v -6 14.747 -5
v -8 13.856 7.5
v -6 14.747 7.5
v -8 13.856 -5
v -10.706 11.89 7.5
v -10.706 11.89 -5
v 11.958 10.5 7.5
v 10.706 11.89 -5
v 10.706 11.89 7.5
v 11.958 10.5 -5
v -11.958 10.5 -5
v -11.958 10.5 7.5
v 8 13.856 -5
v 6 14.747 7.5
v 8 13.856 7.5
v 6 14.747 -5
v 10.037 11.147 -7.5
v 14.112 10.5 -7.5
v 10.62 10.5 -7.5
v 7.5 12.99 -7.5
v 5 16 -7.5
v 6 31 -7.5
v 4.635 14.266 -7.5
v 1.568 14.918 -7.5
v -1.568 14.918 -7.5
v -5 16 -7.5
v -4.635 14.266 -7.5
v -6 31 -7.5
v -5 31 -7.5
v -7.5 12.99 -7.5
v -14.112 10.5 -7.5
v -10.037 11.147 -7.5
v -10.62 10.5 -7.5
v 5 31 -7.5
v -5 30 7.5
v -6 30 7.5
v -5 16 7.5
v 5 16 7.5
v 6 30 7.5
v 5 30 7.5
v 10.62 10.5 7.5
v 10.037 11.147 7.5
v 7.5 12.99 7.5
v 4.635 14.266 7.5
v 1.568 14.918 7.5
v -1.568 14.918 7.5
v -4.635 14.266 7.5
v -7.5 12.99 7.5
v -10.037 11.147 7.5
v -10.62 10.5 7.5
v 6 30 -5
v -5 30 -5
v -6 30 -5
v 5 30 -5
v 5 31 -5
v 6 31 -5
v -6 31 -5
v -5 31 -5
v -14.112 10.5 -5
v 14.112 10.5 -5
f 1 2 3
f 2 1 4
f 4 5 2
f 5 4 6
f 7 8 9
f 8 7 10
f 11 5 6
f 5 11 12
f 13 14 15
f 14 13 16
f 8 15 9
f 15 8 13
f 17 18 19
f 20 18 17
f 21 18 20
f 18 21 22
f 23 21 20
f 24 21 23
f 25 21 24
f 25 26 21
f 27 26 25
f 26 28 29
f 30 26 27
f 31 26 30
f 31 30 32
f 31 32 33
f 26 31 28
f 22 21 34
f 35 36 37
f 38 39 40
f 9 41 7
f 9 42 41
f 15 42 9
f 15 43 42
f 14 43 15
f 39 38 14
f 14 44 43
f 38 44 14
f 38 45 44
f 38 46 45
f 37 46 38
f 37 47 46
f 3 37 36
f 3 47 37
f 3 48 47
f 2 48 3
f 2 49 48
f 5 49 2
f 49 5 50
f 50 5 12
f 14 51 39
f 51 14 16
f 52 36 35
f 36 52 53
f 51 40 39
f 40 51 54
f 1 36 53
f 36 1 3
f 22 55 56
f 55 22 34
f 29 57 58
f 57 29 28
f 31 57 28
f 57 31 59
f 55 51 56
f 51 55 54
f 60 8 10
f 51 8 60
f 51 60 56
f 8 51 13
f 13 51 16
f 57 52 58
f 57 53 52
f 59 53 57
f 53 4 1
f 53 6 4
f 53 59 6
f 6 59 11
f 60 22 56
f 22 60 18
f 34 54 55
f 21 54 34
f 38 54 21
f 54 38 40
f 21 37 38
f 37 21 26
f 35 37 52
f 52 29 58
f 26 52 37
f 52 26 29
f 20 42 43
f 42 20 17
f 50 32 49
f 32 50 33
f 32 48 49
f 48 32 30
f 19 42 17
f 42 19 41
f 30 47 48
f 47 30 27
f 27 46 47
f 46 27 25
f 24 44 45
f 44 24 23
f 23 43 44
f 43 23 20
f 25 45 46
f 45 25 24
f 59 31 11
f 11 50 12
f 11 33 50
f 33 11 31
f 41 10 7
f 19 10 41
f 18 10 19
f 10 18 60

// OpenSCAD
tube_diameter = 28;
margin = 1 ;
thickness	    =1;
width = 15;
beam_size = 10;
beam_thickness = 15;
clip_width=10;

rotate([-90,0,0]) difference(){
	union(){
		// Cylinder
		rotate([90,0,0]) cylinder(r=tube_diameter/2+thickness+margin, h = width, center=true);

		// Top flat part
		translate([0, 0, beam_thickness]) cube(size=[beam_size+2*thickness, width, tube_diameter+2*thickness], 	center = true);
		
		// Part to block strap
		translate([0, width/2-(width-clip_width)/4, 0]) hull(){
		rotate([90,0,0]) cylinder(r=tube_diameter/2+thickness+margin+1, h = (width-clip_width)/2, center=true);
		translate([0, 0, beam_thickness+1]) cube(size=[beam_size+2*thickness, (width-clip_width)/2, tube_diameter+2*thickness], center = true);
		}

//		// Second part to block strap
//		translate([0, -width/2+(width-clip_width)/4, 0]) hull(){
//		rotate([90,0,0]) cylinder(r=tube_diameter/2+thickness+margin+1, h = (width-clip_width)/2, center=true);
//		translate([0, 0, beam_thickness+1]) cube(size=[beam_size+2*thickness, (width-clip_width)/2, tube_diameter+2*thickness], center = true);
//		}
	}

	// Place for beam
	translate([0, 0, tube_diameter/2+thickness*2+beam_thickness/2+1]) cube(size=[beam_size, 2*width, beam_thickness+2], center = true);

	// Cylinder corresponding to space for bar
	rotate([90,0,0]) cylinder(r=tube_diameter/2+margin, h = 2*width, center=true);

	// Cube to hide bottom
	translate([0, 0, -tube_diameter*5/8]) cube(size=[2*tube_diameter, 2*width, tube_diameter*2], center=true);

}
